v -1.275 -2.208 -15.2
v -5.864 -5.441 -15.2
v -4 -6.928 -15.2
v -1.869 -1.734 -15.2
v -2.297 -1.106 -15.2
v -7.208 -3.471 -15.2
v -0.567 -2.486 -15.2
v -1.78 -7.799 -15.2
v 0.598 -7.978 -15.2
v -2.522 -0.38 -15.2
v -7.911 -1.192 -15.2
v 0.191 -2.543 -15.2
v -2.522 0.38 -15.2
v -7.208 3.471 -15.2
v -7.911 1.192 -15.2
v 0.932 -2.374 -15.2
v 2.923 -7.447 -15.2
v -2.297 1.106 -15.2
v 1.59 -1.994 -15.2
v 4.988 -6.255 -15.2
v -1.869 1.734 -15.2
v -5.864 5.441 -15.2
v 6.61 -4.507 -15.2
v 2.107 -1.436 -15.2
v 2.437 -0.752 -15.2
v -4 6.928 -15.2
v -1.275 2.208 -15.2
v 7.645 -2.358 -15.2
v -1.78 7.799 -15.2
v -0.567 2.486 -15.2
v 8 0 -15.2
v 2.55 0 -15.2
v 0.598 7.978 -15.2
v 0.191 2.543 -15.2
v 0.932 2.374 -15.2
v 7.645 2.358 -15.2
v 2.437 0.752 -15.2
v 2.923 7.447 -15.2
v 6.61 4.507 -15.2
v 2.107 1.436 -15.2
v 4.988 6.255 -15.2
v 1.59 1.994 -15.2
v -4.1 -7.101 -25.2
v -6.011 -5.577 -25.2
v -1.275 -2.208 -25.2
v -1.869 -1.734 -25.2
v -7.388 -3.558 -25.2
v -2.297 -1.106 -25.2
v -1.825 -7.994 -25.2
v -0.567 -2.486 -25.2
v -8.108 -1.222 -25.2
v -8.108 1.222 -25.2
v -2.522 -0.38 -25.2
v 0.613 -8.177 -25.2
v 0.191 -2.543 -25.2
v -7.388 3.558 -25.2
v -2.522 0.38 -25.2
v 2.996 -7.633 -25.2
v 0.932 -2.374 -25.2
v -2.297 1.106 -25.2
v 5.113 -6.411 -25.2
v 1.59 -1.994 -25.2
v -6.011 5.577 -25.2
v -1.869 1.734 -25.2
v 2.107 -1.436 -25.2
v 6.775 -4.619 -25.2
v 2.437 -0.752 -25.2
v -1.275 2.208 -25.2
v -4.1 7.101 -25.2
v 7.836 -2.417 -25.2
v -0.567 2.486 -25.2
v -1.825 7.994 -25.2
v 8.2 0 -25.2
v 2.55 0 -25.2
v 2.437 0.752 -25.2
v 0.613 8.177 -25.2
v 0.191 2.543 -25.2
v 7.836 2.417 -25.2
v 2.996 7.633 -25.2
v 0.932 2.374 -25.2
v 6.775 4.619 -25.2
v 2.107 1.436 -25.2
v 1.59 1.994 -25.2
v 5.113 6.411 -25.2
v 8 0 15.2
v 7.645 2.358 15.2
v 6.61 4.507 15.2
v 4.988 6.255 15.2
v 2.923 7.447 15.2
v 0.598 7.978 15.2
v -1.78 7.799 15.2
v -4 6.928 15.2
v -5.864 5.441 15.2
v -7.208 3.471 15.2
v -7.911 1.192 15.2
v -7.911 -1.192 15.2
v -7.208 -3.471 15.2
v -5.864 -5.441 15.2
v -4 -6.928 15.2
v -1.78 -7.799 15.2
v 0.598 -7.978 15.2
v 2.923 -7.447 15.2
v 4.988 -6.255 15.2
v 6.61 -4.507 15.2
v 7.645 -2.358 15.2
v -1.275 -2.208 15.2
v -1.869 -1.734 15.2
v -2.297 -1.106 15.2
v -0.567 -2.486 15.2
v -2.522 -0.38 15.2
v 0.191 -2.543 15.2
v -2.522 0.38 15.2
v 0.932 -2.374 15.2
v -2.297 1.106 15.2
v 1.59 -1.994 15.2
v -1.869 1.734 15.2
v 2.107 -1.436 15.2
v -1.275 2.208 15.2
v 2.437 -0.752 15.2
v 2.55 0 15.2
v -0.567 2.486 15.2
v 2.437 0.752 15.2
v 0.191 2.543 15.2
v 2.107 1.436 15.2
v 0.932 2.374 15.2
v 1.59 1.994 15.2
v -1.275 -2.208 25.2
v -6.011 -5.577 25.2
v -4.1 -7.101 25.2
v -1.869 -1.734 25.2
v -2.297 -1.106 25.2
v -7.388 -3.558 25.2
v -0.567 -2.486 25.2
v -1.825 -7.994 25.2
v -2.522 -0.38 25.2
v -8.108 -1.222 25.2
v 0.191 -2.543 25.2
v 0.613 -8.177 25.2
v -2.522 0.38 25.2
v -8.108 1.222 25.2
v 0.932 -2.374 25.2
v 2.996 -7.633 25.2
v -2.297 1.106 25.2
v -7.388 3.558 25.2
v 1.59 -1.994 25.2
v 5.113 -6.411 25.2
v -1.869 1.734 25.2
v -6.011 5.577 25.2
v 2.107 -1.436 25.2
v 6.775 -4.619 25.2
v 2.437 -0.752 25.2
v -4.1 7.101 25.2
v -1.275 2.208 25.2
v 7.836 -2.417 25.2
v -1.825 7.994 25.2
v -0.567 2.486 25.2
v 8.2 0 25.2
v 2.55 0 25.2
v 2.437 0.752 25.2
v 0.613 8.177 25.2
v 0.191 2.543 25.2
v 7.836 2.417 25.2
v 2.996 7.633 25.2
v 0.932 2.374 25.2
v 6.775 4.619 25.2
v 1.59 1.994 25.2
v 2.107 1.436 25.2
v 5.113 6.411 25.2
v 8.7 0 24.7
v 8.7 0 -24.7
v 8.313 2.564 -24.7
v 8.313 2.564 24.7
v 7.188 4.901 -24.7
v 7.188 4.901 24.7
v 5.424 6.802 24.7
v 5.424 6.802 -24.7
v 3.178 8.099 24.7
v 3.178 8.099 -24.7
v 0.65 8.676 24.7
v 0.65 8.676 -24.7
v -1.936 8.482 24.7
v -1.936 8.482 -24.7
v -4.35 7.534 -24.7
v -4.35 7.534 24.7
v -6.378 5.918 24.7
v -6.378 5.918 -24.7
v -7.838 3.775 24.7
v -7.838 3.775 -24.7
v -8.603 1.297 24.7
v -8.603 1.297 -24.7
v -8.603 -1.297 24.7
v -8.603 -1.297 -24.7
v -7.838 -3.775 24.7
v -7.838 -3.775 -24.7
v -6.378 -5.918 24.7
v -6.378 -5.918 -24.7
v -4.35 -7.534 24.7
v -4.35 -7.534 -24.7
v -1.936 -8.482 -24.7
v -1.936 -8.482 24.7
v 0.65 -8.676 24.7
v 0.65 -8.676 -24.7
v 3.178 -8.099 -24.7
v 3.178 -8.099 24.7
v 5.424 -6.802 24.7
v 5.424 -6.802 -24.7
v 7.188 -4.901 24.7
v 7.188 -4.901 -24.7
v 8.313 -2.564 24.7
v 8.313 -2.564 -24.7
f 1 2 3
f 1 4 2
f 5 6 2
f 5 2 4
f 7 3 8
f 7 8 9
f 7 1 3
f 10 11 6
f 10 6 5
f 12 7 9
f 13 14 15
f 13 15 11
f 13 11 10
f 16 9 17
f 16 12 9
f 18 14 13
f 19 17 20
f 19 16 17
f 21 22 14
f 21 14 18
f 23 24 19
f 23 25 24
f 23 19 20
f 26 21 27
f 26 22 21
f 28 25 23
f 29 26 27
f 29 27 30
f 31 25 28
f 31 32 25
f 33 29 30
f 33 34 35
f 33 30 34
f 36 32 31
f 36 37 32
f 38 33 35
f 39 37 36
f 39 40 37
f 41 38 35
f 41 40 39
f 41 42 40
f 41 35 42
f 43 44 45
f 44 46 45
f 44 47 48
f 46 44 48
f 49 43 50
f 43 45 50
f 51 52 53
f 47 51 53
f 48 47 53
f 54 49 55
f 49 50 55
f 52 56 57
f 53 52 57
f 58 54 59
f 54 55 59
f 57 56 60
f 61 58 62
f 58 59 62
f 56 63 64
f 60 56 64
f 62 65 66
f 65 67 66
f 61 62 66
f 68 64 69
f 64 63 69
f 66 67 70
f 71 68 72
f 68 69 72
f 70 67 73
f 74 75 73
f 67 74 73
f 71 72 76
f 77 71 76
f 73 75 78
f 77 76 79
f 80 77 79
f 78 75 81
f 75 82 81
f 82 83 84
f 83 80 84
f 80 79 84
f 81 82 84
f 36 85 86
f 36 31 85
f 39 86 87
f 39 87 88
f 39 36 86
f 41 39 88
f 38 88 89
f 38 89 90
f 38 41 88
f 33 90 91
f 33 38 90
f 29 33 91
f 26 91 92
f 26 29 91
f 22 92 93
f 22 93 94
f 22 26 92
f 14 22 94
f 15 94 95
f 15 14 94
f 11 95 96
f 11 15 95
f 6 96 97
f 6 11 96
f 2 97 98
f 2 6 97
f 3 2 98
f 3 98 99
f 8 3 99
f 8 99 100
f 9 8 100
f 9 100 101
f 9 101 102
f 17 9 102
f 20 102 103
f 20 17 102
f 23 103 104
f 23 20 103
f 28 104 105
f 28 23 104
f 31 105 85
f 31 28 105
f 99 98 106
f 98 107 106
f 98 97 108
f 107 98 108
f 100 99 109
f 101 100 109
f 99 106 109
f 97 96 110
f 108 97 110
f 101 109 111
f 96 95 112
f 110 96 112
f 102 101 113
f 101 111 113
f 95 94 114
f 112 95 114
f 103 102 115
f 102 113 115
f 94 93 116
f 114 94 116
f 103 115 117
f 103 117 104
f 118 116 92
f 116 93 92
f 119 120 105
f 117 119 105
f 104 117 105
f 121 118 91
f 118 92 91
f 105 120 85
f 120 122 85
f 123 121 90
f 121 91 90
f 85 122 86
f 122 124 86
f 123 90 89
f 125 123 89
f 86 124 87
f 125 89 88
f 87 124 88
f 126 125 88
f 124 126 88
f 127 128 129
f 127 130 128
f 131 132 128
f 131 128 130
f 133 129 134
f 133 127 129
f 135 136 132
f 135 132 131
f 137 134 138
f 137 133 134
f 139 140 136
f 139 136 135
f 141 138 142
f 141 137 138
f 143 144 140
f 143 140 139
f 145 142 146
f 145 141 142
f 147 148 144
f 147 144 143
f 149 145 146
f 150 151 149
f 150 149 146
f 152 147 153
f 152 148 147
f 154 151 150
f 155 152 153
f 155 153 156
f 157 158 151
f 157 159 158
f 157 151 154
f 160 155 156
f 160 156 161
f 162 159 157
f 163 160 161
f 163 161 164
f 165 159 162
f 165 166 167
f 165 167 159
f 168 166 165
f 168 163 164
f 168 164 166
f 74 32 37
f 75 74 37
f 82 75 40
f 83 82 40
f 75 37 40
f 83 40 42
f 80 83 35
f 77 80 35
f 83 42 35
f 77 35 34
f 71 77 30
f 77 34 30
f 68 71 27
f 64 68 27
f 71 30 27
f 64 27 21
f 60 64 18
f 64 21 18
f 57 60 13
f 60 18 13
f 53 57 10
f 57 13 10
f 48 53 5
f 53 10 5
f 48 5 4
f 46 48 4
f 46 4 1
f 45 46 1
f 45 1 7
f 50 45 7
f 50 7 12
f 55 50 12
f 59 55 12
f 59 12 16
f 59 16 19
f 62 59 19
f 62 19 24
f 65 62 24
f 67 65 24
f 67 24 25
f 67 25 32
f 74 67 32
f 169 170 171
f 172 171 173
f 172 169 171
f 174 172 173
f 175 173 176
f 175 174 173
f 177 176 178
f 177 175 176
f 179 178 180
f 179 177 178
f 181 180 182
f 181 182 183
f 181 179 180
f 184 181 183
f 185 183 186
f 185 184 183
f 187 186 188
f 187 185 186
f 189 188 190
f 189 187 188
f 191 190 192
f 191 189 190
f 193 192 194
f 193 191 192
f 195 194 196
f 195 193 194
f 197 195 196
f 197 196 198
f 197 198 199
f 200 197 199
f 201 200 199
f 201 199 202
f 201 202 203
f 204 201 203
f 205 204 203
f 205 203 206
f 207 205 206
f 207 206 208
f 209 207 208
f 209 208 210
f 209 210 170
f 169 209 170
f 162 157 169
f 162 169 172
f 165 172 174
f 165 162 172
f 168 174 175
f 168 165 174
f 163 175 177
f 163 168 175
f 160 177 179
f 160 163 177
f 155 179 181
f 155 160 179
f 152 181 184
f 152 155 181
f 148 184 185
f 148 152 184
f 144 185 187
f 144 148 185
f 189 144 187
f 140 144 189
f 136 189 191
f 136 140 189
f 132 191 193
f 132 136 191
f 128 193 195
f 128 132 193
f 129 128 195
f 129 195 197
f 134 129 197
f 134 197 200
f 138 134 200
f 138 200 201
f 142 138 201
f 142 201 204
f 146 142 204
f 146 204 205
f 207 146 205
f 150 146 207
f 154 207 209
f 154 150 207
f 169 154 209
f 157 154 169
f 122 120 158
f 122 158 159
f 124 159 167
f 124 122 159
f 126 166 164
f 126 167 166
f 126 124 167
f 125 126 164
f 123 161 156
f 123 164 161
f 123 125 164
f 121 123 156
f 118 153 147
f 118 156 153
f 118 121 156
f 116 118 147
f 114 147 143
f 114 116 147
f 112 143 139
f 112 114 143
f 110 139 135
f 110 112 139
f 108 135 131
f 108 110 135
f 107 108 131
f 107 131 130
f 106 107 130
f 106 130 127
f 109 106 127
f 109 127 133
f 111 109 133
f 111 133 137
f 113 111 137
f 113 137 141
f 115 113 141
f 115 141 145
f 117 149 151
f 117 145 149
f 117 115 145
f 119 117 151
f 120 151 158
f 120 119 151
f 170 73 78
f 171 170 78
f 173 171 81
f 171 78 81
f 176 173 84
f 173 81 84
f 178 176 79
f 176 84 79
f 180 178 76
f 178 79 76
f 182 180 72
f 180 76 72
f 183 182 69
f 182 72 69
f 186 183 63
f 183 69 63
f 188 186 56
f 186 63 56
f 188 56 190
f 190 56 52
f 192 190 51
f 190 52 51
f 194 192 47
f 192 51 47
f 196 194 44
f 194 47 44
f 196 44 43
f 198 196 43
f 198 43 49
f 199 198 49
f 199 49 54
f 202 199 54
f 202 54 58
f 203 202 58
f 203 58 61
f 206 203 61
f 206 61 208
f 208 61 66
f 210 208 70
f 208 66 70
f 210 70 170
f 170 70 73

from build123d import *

# Parameters (mm, degrees)
SKETCH1_R                = 8.7
BASE_EXTRUDE_DEPTH       = 25.2
BASE_EXTRUDE_DEPTH_BACK  = 25.2
SKETCH2_R                = 8
STROKECHAMBER_DEPTH      = 15.2
STROKECHAMBER_DEPTH_BACK = 15.2
CHAMFER1_SIZE            = 0.5
SKETCH3_R                = 2.55
THRUBORE_DEPTH           = 26.2
SKETCH4_R                = 2.55
CUT_EXTRUDE1_DEPTH       = 51.4


with BuildPart() as part:
    # Sketch1 → Base-Extrude (new body, two sides)
    with BuildSketch(Plane.XY) as base_extrude_sk:
        Circle(SKETCH1_R)
    extrude(amount=BASE_EXTRUDE_DEPTH)
    extrude(base_extrude_sk.sketch, amount=-BASE_EXTRUDE_DEPTH_BACK)

    # Sketch2 → StrokeChamber (cut, two sides)
    with BuildSketch(Plane.XY) as strokechamber_sk:
        Circle(SKETCH2_R)
    extrude(amount=STROKECHAMBER_DEPTH, mode=Mode.SUBTRACT)
    extrude(strokechamber_sk.sketch, amount=-STROKECHAMBER_DEPTH_BACK, mode=Mode.SUBTRACT)

    # Chamfer1
    chamfer1_edges = [part.edges().sort_by_distance(p)[0] for p in [
        (-8.7, 0, 25.2),
        (-8.7, 0, -25.2),
    ]]
    chamfer(chamfer1_edges, length=CHAMFER1_SIZE)

    # Sketch3 → Thrubore (cut, through all)
    with BuildSketch(Plane.XY):
        Circle(SKETCH3_R)
    extrude(amount=THRUBORE_DEPTH, mode=Mode.SUBTRACT)

    # Sketch4 → Cut-Extrude1 (cut, through all)
    with BuildSketch(Plane.XY.offset(25.2)):
        Circle(SKETCH4_R)
    extrude(amount=-CUT_EXTRUDE1_DEPTH, mode=Mode.SUBTRACT)


solid = part.part
